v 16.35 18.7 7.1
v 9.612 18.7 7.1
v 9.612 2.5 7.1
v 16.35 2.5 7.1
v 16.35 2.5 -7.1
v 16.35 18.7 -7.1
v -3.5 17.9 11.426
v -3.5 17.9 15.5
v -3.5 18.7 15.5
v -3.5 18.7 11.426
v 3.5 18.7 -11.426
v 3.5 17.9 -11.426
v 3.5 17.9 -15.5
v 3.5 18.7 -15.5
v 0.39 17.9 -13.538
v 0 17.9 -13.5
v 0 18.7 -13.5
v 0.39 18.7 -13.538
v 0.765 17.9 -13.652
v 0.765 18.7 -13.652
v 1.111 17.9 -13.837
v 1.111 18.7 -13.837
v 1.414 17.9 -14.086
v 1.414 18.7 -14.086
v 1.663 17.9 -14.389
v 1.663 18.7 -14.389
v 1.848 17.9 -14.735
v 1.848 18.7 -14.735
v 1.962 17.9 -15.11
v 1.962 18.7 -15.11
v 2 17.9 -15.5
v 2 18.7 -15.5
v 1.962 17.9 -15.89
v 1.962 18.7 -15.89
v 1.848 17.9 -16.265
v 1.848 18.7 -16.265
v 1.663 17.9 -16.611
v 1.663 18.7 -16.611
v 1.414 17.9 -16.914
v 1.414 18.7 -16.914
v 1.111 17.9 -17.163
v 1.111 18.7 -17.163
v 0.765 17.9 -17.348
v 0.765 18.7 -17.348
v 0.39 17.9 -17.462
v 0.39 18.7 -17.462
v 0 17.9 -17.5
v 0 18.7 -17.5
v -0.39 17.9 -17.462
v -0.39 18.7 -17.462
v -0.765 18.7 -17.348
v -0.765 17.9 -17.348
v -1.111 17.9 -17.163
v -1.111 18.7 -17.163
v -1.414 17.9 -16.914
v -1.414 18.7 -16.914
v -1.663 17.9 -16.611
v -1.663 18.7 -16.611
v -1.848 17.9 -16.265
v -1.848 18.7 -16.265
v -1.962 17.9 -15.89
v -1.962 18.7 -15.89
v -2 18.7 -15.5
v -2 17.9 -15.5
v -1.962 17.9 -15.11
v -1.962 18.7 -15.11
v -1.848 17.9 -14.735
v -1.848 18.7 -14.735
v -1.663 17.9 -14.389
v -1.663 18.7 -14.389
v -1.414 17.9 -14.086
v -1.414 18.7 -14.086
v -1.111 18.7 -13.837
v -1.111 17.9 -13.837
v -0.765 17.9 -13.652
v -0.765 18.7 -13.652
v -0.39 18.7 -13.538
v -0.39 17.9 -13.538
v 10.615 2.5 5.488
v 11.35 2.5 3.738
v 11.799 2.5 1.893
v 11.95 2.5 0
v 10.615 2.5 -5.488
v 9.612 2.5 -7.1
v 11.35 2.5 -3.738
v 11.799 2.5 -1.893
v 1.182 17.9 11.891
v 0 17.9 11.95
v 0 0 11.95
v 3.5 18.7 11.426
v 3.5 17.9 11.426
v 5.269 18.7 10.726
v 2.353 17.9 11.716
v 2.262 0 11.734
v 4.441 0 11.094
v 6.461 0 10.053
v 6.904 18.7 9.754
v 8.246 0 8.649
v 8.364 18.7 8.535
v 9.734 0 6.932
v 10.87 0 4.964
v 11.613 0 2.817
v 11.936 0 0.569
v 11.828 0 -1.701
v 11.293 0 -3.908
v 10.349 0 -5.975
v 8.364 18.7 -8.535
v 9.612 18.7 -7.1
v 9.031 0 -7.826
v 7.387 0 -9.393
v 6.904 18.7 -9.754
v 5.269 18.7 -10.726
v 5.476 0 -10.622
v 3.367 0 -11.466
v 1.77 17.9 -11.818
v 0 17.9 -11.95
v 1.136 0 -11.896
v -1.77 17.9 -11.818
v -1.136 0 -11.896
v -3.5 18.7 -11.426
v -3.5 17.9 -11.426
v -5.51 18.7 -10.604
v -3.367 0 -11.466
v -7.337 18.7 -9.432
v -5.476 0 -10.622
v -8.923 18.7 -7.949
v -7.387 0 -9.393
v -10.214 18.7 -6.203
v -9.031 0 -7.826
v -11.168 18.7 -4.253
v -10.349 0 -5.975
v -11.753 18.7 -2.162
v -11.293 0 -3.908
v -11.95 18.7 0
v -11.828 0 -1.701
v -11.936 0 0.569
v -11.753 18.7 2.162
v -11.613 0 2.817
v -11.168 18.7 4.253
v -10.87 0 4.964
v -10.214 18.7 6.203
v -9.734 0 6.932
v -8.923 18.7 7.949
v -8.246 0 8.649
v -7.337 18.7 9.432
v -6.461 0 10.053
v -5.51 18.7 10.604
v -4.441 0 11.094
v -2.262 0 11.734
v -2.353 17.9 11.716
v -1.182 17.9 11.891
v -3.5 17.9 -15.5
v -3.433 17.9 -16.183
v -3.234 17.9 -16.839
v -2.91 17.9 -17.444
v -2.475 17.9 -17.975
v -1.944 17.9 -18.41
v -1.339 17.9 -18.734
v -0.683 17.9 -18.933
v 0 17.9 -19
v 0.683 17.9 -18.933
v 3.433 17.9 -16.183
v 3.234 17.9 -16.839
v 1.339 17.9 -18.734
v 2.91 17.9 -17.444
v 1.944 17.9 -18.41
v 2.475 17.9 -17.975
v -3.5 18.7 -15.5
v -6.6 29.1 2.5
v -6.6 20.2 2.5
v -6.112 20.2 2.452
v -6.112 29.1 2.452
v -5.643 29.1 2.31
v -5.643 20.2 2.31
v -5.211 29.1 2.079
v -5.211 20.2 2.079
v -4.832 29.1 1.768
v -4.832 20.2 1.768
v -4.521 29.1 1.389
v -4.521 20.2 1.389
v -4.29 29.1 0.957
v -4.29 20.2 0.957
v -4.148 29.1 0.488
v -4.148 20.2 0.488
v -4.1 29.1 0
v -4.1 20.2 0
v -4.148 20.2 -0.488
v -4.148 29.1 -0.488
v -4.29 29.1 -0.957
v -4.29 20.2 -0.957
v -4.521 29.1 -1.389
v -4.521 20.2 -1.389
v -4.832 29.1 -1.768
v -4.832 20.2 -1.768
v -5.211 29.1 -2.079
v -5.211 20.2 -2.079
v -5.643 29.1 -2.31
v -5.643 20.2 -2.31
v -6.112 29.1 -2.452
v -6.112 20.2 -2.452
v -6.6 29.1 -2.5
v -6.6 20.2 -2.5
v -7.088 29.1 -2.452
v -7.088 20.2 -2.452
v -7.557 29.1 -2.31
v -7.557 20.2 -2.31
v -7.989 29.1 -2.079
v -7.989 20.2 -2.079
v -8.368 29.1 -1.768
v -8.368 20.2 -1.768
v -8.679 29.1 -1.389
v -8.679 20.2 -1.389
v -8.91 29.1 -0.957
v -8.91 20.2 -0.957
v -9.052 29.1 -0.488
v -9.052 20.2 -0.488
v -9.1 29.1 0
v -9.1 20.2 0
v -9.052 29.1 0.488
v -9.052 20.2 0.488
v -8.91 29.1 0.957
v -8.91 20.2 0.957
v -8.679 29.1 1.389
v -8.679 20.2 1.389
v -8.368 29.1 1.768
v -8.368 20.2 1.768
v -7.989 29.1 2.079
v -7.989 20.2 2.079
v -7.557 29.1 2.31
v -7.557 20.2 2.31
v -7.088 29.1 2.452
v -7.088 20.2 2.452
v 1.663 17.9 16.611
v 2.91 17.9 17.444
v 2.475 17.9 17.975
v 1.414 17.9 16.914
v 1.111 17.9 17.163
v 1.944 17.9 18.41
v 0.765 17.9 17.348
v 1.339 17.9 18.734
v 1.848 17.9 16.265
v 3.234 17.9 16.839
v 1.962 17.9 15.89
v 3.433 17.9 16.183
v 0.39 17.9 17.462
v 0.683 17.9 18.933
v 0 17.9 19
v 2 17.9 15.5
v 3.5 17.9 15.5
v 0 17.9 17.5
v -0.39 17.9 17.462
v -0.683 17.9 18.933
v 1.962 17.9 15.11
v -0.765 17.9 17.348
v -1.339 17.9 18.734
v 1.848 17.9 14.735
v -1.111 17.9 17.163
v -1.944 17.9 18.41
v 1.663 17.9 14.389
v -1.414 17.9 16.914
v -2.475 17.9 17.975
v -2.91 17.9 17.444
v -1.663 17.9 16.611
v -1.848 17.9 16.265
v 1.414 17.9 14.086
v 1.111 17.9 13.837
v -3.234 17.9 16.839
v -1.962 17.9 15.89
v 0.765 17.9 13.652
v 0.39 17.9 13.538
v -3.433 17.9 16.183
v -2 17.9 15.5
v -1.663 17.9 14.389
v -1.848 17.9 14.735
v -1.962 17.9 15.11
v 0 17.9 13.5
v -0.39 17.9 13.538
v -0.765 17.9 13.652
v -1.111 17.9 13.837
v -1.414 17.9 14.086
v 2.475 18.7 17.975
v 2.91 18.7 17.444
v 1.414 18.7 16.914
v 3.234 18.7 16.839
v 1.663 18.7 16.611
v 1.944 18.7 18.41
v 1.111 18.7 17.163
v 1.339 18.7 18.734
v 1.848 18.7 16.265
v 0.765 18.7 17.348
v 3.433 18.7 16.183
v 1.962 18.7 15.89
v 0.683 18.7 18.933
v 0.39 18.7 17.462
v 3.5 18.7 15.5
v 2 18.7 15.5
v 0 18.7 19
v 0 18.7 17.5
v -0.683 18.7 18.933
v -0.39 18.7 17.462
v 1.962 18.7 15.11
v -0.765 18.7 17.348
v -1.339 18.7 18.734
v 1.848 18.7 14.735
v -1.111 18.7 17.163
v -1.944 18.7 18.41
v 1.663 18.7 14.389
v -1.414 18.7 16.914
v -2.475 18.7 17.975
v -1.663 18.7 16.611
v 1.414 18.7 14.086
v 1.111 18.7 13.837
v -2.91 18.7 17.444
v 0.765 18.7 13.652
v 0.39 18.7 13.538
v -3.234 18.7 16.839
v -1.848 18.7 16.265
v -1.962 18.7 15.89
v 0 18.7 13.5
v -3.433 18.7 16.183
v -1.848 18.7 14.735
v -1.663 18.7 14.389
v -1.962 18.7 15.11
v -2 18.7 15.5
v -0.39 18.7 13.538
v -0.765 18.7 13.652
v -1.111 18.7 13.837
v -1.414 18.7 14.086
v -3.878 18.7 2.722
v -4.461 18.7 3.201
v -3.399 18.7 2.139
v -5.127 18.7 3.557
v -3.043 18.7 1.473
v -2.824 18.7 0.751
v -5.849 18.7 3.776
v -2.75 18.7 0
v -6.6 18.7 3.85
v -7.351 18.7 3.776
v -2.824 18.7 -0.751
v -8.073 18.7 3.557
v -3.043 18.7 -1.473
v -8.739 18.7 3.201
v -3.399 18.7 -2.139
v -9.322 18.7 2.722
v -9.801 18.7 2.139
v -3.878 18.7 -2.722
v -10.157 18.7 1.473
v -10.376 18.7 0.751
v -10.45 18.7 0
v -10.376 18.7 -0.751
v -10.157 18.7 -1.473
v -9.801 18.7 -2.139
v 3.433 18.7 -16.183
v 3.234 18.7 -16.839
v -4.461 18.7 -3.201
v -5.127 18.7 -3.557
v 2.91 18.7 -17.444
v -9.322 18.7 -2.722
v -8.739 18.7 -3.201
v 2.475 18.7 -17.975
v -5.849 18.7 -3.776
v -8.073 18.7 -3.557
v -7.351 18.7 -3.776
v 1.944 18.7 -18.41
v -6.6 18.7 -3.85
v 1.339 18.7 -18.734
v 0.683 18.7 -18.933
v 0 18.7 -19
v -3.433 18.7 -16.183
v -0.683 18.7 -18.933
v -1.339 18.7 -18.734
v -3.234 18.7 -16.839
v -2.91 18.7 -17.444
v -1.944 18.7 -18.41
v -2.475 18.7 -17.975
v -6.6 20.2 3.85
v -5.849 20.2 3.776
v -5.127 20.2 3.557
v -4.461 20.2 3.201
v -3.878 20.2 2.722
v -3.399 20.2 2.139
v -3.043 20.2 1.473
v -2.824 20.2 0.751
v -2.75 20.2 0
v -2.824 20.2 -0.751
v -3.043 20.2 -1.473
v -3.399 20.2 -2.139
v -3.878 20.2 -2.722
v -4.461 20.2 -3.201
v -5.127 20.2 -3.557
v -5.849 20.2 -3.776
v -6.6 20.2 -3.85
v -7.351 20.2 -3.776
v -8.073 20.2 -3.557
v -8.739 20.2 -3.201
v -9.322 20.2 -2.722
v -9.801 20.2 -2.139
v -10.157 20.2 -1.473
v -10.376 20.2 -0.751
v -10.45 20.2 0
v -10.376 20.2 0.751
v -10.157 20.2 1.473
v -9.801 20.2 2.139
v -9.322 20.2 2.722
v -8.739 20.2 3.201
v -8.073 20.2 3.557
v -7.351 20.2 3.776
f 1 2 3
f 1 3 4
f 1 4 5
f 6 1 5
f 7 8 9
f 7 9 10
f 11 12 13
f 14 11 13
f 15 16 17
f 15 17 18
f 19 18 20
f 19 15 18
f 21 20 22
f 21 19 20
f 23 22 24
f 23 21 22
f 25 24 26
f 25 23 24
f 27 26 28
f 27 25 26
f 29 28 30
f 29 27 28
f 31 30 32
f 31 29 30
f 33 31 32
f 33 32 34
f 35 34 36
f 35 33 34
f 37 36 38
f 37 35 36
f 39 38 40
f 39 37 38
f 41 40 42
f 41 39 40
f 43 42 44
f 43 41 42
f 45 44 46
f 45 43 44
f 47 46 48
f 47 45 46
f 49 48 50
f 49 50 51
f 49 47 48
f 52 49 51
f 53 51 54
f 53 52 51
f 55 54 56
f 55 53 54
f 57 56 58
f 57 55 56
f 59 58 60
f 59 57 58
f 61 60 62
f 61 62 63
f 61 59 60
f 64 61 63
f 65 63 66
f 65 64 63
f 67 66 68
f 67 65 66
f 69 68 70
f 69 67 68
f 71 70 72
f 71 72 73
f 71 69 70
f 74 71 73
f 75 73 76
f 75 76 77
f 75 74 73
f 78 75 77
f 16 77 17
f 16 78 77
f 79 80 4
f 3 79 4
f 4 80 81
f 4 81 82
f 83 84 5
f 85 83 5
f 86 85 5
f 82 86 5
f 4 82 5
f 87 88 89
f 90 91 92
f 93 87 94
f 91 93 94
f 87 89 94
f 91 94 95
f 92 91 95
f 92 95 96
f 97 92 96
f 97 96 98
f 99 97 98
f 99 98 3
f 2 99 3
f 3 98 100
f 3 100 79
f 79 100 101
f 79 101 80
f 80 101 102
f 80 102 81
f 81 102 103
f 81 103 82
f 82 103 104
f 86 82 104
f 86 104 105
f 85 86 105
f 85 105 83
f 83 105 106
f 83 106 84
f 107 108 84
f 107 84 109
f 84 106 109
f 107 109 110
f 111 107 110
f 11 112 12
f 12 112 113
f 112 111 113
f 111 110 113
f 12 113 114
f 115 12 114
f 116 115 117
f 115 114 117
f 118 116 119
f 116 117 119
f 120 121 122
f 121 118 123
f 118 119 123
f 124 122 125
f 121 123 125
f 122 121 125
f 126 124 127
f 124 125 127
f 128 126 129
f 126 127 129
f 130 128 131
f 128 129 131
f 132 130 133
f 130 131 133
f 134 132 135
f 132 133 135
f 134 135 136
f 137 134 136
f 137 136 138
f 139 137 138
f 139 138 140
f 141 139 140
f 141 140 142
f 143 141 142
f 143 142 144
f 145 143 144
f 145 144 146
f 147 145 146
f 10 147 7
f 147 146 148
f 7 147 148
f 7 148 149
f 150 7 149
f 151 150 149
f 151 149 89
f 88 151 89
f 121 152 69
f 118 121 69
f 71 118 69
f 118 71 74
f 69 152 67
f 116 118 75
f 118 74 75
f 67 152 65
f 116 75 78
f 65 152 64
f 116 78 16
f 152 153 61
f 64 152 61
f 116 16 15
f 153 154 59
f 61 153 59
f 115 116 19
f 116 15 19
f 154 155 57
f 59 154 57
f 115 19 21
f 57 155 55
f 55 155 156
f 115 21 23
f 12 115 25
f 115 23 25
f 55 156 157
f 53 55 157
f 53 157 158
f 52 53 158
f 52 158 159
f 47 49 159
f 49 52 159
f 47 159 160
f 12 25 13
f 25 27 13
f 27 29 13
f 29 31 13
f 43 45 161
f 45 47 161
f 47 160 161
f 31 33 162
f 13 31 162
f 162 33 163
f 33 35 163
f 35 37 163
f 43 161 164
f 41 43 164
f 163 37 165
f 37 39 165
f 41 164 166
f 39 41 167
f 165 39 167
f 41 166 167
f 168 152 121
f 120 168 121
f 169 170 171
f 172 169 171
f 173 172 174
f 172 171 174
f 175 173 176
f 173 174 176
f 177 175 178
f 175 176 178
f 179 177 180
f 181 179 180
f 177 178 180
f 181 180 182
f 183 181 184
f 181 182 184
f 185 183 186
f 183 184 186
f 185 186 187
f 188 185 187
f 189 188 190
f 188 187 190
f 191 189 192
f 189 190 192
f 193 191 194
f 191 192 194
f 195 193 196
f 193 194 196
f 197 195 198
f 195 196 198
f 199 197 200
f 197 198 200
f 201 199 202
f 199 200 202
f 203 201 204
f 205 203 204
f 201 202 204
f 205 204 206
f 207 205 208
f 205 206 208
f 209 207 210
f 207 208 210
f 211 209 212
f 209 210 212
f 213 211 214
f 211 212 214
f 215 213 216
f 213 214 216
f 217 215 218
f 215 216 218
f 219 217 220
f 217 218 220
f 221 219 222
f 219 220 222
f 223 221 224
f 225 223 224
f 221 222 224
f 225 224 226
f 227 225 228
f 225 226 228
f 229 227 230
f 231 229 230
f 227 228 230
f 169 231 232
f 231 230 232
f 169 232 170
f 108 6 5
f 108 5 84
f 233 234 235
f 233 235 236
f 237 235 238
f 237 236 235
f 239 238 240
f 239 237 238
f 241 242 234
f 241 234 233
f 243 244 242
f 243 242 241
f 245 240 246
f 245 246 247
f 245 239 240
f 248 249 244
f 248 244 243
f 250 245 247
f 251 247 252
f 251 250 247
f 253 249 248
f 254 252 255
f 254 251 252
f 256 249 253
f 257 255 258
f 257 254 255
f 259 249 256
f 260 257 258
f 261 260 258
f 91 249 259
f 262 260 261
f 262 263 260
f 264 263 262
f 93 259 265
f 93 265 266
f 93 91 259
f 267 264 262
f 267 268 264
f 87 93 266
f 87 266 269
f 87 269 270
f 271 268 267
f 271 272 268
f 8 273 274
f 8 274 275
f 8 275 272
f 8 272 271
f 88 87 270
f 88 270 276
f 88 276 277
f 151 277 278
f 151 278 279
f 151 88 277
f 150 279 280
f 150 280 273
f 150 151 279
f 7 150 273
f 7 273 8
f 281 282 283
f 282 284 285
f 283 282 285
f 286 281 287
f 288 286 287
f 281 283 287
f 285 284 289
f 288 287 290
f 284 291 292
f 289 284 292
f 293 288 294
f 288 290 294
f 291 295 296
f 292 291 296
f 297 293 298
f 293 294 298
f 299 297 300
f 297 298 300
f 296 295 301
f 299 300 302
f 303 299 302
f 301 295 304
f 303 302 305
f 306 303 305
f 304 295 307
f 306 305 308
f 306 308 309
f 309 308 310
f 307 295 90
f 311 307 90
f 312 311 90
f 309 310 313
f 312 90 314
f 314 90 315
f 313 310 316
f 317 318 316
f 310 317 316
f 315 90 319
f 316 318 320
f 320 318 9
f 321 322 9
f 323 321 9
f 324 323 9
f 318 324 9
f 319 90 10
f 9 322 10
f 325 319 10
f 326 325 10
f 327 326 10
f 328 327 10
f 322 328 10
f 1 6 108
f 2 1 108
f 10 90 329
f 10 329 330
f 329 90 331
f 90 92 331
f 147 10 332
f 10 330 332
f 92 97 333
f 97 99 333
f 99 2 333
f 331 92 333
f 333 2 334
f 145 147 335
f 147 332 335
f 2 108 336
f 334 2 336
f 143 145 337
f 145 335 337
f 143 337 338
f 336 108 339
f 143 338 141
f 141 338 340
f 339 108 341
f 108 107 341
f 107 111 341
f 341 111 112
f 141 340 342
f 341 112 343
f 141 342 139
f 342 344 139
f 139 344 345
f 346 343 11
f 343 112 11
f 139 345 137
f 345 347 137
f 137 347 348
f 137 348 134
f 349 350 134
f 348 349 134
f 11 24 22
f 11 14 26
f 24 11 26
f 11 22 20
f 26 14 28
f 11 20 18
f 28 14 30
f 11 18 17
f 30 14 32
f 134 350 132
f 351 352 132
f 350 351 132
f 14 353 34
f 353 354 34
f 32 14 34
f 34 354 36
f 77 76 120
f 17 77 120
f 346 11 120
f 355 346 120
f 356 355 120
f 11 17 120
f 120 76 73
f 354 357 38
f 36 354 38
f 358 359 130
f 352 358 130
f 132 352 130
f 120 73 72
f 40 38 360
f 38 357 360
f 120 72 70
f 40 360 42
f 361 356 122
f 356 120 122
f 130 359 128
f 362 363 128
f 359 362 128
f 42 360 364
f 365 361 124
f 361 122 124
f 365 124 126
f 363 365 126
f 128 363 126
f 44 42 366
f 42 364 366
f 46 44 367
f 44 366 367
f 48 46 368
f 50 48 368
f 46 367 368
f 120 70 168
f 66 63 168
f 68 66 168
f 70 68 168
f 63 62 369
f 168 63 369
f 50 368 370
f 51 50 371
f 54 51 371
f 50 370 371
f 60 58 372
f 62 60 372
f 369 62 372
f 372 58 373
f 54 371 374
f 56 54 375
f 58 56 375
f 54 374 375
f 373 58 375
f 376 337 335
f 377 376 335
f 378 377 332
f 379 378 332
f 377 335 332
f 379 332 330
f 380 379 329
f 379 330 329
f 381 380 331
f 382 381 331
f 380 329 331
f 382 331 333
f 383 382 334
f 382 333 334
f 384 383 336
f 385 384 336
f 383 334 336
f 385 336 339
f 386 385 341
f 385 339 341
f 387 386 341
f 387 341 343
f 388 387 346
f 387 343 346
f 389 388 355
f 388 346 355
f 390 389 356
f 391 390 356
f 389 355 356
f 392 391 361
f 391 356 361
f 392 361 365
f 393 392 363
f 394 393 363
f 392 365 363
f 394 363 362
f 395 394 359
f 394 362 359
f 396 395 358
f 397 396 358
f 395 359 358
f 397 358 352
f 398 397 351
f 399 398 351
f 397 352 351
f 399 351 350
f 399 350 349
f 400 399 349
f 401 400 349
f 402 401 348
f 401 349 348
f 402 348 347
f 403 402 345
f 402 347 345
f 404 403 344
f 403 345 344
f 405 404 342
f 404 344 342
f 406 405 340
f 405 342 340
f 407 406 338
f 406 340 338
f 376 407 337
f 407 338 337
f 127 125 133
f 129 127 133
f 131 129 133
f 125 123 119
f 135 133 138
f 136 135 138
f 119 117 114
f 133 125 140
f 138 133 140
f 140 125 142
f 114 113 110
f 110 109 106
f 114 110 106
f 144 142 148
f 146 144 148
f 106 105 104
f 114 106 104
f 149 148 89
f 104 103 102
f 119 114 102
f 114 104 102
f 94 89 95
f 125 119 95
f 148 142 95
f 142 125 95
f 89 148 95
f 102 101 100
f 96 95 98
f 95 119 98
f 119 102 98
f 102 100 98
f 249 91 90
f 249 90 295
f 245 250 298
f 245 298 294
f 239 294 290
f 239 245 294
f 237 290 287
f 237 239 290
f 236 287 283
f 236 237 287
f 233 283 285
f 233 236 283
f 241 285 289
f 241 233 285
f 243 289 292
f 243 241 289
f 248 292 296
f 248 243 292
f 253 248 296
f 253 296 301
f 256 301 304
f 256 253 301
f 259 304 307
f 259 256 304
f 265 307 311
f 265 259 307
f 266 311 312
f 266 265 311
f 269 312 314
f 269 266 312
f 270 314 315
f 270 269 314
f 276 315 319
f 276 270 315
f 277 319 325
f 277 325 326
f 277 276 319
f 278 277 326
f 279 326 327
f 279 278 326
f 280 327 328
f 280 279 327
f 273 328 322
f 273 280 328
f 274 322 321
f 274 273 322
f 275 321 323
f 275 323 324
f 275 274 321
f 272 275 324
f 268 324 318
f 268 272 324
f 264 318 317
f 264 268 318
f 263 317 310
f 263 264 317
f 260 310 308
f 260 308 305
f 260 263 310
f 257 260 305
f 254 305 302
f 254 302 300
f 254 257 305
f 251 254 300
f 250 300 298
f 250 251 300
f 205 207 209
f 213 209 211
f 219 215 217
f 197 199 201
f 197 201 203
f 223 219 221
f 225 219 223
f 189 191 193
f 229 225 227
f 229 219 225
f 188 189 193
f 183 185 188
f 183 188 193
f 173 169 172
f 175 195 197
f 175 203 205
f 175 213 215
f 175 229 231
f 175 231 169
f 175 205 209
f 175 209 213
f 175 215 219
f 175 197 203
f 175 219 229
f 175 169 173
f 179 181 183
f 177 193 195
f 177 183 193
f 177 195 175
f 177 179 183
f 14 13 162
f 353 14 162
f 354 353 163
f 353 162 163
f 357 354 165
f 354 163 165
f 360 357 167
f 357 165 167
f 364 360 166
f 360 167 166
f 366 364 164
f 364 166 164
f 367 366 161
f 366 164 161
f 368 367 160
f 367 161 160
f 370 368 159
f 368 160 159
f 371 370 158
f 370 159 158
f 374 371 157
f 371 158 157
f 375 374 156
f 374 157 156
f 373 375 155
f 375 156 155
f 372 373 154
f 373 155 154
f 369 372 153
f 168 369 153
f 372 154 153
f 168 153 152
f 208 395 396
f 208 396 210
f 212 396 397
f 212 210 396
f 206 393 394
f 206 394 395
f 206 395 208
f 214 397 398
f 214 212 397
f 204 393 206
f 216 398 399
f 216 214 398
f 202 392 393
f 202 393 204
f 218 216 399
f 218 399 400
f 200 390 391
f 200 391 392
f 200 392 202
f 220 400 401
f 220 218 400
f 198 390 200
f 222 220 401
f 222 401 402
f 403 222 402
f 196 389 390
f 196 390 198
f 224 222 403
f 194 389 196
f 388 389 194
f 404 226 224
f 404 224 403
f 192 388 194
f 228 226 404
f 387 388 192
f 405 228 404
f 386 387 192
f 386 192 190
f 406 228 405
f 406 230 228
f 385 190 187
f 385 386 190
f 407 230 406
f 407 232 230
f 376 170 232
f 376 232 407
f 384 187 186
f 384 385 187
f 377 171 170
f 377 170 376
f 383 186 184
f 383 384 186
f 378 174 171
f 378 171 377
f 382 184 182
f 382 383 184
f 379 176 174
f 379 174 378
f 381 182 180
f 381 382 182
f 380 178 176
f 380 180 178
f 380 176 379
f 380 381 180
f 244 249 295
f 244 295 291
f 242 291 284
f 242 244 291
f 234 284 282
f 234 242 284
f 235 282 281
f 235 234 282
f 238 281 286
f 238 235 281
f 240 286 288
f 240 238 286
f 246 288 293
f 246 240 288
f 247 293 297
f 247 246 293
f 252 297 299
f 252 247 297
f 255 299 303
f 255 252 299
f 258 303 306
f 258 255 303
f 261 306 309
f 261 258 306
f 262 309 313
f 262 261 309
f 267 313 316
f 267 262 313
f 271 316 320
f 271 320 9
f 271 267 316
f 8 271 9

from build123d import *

# Parameters (mm, degrees)
SKETCH_1_R       = 11.95
EXTRUDE_1_DEPTH  = 18.7
EXTRUDE_START    = -16.2
EXTRUDE_8_DEPTH  = 16.2
EXTRUDE_START_2  = -0.8
SKETCH_3_R       = 2
EXTRUDE_9_DEPTH  = 0.8
SKETCH_4_R       = 3.85
EXTRUDE_10_DEPTH = 1.5
SKETCH_5_R       = 2.5
EXTRUDE_11_DEPTH = 8.9


with BuildPart() as part:
    # 草图1 → 凸台-拉伸1 (new body)
    with BuildSketch(Plane(origin=(0, 0, 0), x_dir=(1, 0, 0), z_dir=(0, 1, 0))):
        with Locations(Location((0, 0, 0), (0, 0, 270))):
            Circle(SKETCH_1_R)
    extrude(amount=EXTRUDE_1_DEPTH)

    # 草图2 → 凸台-拉伸8 (add)
    with BuildSketch(Plane(origin=(0, 18.7, 0), x_dir=(1, 0, 0), z_dir=(0, 1, 0)).offset(EXTRUDE_START)):
        with BuildLine():
            ThreePointArc((9.612101747, 7.1), (11.350487123, 3.737504791), (11.95, 0))
            Line((11.95, 0), (16.35, 0))
            Line((16.35, 0), (16.35, 7.1))
            Line((16.35, 7.1), (9.612101747, 7.1))
        make_face()
        with BuildLine():
            Line((16.35, 0), (11.95, 0))
            ThreePointArc((11.95, 0), (11.350487123, -3.737504791), (9.612101747, -7.1))
            Line((9.612101747, -7.1), (16.35, -7.1))
            Line((16.35, -7.1), (16.35, 0))
        make_face()
    extrude(amount=EXTRUDE_8_DEPTH)

    # 草图3 → 凸台-拉伸9 (add)
    # profile 1 of 2: a face of its own
    with BuildSketch(Plane(origin=(0, 18.7, 0), x_dir=(1, 0, 0), z_dir=(0, 1, 0)).offset(EXTRUDE_START_2)):
        with BuildLine():
            Line((-3.5, 15.5), (-3.5, 11.42595729))
            ThreePointArc((-3.5, 11.42595729), (0, 11.95), (3.5, 11.42595729))
            Line((3.5, 11.42595729), (3.5, 15.5))
            ThreePointArc((3.5, 15.5), (0, 19), (-3.5, 15.5))
        make_face()
        with Locations(Location((0, 15.5, 0), (0, 0, 270))):
            Circle(SKETCH_3_R, mode=Mode.SUBTRACT)
    # profile 2 of 2: a face of its own
    with BuildSketch(Plane(origin=(0, 18.7, 0), x_dir=(1, 0, 0), z_dir=(0, 1, 0)).offset(EXTRUDE_START_2)):
        with BuildLine():
            Line((-3.5, -15.5), (-3.5, -11.42595729))
            ThreePointArc((-3.5, -11.42595729), (0, -11.95), (3.5, -11.42595729))
            Line((3.5, -11.42595729), (3.5, -15.5))
            ThreePointArc((3.5, -15.5), (0, -19), (-3.5, -15.5))
        make_face()
        with Locations(Location((0, -15.5, 0), (0, 0, 270))):
            Circle(SKETCH_3_R, mode=Mode.SUBTRACT)
    extrude(amount=EXTRUDE_9_DEPTH)

    # 草图4 → 凸台-拉伸10 (add)
    with BuildSketch(Plane(origin=(0, 18.7, 0), x_dir=(1, 0, 0), z_dir=(0, 1, 0))):
        with Locations(Location((-6.6, 0, 0), (0, 0, 270))):
            Circle(SKETCH_4_R)
    extrude(amount=EXTRUDE_10_DEPTH)

    # 草图5 → 凸台-拉伸11 (add)
    with BuildSketch(Plane(origin=(0, 20.2, 0), x_dir=(1, 0, 0), z_dir=(0, 1, 0))):
        with Locations(Location((-6.6, 0, 0), (0, 0, 270))):
            Circle(SKETCH_5_R)
    extrude(amount=EXTRUDE_11_DEPTH)


solid = part.part
